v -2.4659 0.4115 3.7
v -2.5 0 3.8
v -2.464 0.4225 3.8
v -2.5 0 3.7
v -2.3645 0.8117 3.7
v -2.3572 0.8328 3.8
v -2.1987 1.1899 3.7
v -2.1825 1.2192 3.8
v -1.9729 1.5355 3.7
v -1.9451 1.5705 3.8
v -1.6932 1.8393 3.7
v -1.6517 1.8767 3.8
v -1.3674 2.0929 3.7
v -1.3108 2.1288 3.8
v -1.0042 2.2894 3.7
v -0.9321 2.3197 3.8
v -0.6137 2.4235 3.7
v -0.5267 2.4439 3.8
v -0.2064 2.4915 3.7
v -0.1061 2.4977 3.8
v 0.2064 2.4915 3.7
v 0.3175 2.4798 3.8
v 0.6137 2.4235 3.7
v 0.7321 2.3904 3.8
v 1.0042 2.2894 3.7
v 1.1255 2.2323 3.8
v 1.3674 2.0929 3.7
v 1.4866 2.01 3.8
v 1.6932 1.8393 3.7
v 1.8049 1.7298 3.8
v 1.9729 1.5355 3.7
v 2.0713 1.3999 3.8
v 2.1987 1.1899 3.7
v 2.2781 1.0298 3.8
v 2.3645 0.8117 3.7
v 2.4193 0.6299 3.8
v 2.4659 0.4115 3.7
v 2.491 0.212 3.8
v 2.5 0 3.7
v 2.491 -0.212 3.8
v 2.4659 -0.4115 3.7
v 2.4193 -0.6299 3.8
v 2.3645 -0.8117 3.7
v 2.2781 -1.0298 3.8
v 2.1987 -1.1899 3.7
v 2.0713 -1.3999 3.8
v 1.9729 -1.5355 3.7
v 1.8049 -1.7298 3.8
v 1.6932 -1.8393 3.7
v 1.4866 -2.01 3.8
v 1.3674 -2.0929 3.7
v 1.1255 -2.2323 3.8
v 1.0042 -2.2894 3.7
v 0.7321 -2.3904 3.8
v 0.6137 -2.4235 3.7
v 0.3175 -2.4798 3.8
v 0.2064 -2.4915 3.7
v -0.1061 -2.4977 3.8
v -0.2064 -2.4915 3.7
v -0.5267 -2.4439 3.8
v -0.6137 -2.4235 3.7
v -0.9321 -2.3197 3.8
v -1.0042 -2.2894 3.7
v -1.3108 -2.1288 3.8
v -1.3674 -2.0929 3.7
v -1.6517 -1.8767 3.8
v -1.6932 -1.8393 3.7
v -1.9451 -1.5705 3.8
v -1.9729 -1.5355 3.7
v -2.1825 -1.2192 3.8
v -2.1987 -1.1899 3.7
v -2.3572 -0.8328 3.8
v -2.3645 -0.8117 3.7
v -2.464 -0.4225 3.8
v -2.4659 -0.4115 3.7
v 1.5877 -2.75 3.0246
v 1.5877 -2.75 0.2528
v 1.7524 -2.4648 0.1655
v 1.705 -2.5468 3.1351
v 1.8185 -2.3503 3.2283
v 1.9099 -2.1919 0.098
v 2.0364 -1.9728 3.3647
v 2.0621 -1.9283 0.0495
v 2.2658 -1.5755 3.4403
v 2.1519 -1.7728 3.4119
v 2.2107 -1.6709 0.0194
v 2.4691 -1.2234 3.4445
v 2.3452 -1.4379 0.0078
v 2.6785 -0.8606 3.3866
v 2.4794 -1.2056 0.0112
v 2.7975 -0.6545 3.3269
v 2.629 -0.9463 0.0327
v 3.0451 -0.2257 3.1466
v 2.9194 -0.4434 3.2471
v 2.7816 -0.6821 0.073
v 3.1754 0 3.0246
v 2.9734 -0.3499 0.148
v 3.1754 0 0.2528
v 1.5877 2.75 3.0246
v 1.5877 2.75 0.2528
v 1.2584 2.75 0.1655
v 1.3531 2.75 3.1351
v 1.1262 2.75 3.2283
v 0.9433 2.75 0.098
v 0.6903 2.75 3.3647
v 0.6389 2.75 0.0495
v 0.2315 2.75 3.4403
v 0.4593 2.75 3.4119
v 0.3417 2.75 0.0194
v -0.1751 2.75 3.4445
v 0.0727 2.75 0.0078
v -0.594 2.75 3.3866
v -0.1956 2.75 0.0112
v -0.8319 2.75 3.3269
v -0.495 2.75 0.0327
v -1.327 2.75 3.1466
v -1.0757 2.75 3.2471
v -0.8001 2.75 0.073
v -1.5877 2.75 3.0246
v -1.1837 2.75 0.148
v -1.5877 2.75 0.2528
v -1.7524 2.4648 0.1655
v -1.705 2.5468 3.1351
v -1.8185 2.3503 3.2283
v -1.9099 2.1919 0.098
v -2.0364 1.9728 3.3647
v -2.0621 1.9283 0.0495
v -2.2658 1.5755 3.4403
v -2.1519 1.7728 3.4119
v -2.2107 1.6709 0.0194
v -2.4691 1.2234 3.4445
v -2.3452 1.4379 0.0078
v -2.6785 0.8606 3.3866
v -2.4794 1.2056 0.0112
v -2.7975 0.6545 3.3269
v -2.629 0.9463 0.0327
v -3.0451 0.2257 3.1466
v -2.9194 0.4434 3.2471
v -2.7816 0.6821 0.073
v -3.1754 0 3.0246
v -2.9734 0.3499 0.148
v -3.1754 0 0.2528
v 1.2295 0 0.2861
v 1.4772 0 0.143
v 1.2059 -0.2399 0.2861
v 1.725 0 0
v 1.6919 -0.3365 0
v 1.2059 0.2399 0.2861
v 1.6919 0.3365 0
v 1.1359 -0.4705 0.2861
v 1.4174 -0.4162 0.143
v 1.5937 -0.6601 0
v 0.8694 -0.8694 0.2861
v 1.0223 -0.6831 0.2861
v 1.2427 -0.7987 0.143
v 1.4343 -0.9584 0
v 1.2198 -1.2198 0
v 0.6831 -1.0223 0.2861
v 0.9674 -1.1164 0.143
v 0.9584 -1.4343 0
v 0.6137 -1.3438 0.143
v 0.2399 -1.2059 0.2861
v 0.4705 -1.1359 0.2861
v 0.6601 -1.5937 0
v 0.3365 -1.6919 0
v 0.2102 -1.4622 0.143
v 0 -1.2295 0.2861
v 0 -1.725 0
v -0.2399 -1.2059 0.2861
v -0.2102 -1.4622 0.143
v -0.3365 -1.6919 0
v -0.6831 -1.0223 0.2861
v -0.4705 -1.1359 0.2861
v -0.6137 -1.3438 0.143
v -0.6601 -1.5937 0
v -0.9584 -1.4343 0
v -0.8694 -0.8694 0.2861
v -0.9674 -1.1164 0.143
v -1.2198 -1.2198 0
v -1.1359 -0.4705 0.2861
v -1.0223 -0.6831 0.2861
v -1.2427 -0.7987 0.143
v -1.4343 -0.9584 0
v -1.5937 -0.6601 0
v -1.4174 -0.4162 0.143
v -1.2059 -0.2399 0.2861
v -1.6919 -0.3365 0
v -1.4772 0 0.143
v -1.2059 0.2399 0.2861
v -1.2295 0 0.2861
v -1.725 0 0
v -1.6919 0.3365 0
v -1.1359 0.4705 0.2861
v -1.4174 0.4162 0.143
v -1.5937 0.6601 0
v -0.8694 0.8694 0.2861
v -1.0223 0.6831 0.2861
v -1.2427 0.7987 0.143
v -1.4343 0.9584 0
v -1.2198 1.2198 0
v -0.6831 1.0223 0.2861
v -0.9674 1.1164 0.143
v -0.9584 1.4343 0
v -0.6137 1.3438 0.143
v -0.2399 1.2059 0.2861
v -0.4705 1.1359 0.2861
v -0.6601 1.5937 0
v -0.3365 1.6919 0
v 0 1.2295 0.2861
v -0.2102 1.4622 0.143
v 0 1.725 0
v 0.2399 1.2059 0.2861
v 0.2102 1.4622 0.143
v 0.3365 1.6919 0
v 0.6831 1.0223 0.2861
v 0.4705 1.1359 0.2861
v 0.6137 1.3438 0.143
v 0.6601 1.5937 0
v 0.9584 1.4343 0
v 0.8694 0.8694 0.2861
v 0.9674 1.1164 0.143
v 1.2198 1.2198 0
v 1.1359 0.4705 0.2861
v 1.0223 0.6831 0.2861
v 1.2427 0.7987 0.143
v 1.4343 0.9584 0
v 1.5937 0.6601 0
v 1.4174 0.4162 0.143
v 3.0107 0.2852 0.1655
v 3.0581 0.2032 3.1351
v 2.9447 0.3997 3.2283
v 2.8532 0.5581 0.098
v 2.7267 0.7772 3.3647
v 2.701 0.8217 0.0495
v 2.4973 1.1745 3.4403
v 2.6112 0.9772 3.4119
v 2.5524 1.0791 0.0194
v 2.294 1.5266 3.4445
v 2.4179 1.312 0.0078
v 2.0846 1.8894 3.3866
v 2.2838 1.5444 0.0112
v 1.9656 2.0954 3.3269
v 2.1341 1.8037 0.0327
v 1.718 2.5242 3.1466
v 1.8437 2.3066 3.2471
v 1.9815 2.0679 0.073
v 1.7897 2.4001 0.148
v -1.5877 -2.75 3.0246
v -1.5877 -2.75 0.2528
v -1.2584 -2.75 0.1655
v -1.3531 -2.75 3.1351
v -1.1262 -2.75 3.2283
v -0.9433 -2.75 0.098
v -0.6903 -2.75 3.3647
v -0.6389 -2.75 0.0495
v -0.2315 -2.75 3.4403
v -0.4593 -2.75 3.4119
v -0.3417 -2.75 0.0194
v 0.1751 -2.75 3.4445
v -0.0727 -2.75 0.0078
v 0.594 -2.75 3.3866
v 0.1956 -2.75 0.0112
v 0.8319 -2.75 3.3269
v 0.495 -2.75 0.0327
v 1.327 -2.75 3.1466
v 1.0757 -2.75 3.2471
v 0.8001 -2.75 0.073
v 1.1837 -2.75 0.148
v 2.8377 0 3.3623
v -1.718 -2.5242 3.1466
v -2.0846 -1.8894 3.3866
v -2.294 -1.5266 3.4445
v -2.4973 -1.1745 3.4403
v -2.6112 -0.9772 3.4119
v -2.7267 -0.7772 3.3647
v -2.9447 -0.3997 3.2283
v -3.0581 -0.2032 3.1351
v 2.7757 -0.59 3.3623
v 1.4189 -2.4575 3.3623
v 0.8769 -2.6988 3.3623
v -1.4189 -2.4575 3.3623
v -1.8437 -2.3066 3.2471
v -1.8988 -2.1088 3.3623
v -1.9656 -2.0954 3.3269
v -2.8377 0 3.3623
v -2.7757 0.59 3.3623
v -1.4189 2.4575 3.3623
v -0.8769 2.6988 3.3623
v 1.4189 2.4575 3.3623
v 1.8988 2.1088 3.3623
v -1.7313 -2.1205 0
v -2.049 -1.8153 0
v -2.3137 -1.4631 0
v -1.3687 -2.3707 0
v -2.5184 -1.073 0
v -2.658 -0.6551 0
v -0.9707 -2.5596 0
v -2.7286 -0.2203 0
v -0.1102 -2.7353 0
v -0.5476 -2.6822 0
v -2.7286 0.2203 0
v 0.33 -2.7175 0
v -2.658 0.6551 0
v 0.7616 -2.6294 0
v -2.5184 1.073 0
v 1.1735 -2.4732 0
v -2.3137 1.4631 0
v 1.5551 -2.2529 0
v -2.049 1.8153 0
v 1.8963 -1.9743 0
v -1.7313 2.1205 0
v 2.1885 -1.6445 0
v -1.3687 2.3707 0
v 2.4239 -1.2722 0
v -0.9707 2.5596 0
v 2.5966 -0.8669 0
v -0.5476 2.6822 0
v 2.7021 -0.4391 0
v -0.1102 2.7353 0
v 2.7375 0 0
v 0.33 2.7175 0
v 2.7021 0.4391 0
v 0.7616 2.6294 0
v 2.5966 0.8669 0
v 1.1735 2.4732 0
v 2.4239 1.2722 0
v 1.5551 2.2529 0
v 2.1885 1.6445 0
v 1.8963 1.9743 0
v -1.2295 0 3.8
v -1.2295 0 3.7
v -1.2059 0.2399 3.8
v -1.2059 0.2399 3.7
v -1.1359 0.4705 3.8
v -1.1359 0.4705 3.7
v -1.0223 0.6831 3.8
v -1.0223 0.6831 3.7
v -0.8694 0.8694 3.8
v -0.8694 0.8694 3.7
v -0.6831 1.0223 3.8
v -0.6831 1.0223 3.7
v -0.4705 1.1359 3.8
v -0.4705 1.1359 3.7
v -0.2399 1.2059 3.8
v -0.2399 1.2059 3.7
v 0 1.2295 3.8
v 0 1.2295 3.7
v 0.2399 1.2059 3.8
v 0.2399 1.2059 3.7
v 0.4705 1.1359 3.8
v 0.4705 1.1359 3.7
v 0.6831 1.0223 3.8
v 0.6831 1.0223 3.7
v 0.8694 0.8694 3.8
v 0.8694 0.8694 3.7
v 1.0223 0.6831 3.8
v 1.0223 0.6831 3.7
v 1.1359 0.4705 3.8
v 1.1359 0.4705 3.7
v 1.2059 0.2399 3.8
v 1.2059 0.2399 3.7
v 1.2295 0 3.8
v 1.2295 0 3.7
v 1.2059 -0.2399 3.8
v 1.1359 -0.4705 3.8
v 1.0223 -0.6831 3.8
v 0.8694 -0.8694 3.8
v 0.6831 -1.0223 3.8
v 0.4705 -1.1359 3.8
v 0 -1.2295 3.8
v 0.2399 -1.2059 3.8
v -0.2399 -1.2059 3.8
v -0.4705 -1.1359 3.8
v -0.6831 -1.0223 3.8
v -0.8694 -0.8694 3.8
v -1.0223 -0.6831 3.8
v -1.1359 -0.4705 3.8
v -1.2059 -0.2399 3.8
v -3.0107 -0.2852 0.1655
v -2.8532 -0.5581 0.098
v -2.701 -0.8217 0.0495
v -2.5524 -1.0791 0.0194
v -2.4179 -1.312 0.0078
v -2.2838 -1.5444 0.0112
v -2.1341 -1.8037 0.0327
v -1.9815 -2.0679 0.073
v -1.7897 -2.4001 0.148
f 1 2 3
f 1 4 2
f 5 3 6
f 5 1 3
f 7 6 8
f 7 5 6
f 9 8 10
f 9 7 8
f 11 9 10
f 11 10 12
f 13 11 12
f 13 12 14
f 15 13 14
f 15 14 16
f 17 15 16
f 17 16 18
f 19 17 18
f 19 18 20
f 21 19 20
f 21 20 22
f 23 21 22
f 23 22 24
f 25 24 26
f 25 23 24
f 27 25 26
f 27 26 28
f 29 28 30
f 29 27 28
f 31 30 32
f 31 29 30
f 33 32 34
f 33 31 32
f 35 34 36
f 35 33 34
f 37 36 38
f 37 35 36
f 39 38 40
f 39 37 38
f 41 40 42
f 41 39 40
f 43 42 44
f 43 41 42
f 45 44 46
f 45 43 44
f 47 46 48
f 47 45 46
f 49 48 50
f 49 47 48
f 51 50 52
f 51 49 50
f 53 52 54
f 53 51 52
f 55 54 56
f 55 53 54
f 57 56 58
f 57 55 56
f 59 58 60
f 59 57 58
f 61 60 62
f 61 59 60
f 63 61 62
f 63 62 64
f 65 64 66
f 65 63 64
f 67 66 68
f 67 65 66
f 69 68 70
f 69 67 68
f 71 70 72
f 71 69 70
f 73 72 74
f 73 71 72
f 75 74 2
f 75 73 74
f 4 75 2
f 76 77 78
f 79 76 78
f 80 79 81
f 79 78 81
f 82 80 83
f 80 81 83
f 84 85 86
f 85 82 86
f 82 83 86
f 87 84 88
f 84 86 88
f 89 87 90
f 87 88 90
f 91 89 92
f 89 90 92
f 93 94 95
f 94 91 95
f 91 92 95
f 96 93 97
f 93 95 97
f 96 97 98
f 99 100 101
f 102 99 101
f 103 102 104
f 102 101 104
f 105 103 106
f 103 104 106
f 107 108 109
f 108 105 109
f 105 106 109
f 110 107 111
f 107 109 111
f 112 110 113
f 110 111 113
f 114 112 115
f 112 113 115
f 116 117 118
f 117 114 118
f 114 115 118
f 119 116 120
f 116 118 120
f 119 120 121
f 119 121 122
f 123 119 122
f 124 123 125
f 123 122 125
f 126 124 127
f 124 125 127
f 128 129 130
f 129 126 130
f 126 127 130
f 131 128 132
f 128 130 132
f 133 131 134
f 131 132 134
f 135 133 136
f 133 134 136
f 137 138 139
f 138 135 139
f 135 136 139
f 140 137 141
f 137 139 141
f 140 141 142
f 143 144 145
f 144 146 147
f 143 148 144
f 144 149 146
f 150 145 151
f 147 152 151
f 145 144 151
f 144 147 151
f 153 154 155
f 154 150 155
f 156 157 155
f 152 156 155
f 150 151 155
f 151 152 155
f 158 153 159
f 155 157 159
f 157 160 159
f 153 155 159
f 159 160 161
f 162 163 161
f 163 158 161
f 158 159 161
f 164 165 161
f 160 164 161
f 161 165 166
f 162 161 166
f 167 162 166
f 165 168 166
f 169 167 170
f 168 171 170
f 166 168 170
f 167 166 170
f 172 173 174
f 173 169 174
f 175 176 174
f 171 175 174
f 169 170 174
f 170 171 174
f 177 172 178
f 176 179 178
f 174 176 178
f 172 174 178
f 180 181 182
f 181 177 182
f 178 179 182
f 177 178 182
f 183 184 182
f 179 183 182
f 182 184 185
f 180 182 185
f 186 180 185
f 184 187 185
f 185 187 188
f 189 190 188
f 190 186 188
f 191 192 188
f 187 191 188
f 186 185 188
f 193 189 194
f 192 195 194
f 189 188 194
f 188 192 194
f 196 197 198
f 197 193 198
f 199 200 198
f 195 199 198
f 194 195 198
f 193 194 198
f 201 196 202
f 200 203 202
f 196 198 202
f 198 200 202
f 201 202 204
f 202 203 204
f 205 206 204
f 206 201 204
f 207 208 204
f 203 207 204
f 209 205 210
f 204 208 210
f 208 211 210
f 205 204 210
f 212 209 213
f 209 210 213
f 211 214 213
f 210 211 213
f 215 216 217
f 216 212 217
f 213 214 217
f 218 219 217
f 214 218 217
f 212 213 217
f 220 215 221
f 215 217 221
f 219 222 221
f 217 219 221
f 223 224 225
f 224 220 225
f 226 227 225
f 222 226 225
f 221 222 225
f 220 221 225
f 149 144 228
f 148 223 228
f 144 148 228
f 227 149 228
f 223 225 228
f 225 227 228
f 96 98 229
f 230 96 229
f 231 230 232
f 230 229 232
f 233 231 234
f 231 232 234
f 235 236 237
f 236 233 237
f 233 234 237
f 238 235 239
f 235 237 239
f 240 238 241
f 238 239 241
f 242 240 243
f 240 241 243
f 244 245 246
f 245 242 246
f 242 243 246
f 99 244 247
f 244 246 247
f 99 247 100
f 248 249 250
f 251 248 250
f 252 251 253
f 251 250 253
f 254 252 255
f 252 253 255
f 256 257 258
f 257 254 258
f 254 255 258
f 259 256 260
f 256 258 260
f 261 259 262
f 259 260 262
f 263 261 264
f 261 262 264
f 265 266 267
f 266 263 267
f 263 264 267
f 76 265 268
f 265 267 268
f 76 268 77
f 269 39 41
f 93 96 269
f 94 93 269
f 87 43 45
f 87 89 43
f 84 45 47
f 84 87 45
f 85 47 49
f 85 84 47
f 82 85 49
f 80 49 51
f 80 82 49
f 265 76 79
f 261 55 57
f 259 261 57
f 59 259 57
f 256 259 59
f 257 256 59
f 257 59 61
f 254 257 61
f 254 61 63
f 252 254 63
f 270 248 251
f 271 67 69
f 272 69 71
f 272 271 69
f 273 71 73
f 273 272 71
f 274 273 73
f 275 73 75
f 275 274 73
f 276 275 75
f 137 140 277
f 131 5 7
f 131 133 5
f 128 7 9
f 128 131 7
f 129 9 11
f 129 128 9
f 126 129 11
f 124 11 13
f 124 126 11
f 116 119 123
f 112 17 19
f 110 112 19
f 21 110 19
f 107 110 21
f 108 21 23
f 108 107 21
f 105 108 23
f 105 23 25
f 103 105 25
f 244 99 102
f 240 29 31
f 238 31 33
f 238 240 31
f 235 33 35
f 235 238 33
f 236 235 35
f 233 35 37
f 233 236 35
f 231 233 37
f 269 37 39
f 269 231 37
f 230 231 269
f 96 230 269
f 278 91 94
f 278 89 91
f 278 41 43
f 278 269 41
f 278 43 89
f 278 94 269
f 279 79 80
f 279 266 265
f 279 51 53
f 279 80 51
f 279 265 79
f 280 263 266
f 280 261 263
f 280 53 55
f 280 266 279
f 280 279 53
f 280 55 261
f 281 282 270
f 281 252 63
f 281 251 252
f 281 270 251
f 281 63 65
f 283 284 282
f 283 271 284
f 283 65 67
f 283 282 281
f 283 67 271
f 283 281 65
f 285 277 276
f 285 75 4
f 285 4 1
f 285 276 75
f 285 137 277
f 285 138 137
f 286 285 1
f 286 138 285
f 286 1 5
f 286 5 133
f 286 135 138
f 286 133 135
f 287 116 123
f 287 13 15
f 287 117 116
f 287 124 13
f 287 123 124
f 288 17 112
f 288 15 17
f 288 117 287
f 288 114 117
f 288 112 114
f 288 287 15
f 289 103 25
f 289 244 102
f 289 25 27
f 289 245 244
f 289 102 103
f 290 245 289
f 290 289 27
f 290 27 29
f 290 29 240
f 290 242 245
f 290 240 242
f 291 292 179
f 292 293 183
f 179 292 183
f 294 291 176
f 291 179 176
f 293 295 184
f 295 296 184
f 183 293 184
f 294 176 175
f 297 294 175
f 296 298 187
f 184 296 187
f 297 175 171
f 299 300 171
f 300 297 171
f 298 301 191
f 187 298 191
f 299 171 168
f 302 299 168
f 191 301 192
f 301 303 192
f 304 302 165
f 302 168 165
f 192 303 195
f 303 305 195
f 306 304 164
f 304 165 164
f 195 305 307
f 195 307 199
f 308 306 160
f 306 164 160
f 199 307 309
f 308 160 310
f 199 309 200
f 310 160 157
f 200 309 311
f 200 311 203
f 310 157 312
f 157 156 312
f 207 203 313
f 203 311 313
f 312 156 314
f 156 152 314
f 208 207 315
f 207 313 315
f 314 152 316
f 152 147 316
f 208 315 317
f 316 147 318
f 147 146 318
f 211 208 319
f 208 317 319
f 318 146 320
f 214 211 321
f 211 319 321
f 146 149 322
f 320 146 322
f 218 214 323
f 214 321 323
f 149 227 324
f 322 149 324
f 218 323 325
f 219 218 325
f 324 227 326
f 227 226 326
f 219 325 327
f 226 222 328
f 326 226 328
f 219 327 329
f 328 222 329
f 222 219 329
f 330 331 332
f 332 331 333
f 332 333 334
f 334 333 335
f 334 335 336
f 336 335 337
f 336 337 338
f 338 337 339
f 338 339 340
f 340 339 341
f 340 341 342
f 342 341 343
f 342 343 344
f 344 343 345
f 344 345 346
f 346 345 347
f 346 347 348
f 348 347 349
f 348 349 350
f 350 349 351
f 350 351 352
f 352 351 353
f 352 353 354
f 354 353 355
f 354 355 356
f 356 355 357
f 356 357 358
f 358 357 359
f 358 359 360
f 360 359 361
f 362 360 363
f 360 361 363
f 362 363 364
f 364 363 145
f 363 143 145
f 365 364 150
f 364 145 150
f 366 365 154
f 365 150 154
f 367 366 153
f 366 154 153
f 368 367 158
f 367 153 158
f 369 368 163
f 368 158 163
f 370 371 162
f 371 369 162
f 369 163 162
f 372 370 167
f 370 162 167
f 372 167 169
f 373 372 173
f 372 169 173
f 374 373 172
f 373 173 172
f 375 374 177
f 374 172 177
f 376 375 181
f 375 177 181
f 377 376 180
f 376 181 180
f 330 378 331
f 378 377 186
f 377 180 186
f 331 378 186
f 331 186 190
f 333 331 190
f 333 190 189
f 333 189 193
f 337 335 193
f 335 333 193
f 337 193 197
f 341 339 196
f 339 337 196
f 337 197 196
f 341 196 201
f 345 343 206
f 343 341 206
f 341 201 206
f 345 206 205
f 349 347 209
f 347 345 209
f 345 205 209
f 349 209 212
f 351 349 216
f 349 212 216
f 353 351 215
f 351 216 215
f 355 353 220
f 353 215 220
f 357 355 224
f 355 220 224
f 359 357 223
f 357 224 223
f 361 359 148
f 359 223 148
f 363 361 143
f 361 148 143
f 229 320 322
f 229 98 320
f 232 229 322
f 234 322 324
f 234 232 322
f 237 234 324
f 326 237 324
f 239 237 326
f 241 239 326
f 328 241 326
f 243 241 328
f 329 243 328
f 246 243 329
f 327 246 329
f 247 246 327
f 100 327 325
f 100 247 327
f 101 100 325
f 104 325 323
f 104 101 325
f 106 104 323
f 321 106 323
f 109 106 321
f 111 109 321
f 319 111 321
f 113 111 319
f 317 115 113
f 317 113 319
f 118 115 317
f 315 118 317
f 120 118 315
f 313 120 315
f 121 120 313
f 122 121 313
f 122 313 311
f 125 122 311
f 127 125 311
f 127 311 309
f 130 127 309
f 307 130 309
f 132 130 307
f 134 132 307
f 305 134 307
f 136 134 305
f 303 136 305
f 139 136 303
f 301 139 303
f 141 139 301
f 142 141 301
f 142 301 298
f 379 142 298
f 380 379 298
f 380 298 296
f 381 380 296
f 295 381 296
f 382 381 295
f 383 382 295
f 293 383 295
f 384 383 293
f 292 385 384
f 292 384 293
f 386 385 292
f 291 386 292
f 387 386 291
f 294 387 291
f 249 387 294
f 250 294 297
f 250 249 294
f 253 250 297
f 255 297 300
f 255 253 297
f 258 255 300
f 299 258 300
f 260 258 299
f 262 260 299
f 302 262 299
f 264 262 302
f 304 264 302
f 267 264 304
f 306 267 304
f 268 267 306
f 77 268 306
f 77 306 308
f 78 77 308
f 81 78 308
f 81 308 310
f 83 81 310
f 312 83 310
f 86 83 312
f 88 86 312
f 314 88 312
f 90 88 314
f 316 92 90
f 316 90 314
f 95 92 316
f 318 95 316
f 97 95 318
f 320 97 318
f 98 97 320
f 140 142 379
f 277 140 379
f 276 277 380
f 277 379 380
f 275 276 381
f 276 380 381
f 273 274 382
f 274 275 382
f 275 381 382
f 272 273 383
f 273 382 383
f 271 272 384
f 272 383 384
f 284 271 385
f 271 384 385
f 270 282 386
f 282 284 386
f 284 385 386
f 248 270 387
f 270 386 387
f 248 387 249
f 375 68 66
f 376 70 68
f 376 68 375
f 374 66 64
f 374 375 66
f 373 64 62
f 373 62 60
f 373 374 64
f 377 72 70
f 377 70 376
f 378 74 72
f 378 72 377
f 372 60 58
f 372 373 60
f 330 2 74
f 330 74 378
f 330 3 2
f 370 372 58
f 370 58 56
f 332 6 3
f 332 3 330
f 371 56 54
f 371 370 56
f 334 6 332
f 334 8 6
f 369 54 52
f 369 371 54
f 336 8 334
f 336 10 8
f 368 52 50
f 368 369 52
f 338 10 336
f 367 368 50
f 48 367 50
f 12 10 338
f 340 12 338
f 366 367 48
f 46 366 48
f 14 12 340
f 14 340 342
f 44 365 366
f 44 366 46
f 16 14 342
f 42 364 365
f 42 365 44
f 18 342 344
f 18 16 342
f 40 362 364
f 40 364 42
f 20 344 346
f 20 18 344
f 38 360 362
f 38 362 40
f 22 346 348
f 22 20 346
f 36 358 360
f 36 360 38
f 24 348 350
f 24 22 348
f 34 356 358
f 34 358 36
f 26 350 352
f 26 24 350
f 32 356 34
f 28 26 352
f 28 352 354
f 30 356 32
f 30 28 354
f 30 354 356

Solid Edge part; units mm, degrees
sketch "Sketch1" plane through (0, 0, 0) normal (0, 0, 1) x (1, 0, 0)
  circle A0 centre (0, 0) radius 1.2295
  circle A1 centre (0, 0) radius 3.1754
extrude "Protrusion1" add sketch "Sketch1" along normal blind 3.7
sketch "Sketch2" plane through (0, 0, 0) normal (0, 0, 1) x (1, 0, 0)
  line L0 (3.1754, 0) -> (1.5877, 2.75)
  arc A0 (1.5877, 2.75) -> (3.1754, 0) centre (0, 0) cw
  dimension "D1" = 2.75
extrude "ExtrudedCutout_1" cut sketch "Sketch2" along normal blind 3.7
pattern_circular "Pattern1" count 6 over 360 about axis through (0, 0, 0) along (0, 0, 1) of "ExtrudedCutout_1"
cosmetic_thread "Thread_1" size "M3" thread depth 3.7
sketch "Sketch3" plane through (0, 0, 0) normal (0, -1, 0) x (1, 0, 0)
  line L0 (2.7375, 0) -> (3.1756, 0)
  line L1 (3.1756, 0) -> (3.1756, 0.2529)
  line L2 (3.1756, 0.2529) -> (2.7375, 0)
  line L3 (2.5, 3.7) -> (3.1756, 3.7)
  line L4 (3.1756, 3.7) -> (3.1756, 3.0244)
  line L5 (3.1756, 3.0244) -> (2.5, 3.7)
  dimension "D1" = 3.7
  dimension "D2" = 2.7375
  dimension "D3" = 3.1756
  dimension "D4" = 2.5
  dimension "D5" = 3.1756
revolve "RevolvedCutout_1" cut sketch "Sketch3" angle 360 about axis through (0, 0, 9) along (0, 0, -1)
chamfer "Chamfer_1" distance 0.4955 angle 30 1 edges at (-1.2295, 0, 0) measured on face at (-1.8798, -1.7702, 0)
sketch "Sketch4" plane through (0, 0, 3.7) normal (0, 0, 1) x (-1, 0, 0)
  circle A0 centre (0, 0) radius 2.5
  circle A1 centre (0, 0) radius 1.2295
extrude "ExtrudedProtrusion_2" add sketch "Sketch4" along normal blind 0.1
properties material "Steel"
